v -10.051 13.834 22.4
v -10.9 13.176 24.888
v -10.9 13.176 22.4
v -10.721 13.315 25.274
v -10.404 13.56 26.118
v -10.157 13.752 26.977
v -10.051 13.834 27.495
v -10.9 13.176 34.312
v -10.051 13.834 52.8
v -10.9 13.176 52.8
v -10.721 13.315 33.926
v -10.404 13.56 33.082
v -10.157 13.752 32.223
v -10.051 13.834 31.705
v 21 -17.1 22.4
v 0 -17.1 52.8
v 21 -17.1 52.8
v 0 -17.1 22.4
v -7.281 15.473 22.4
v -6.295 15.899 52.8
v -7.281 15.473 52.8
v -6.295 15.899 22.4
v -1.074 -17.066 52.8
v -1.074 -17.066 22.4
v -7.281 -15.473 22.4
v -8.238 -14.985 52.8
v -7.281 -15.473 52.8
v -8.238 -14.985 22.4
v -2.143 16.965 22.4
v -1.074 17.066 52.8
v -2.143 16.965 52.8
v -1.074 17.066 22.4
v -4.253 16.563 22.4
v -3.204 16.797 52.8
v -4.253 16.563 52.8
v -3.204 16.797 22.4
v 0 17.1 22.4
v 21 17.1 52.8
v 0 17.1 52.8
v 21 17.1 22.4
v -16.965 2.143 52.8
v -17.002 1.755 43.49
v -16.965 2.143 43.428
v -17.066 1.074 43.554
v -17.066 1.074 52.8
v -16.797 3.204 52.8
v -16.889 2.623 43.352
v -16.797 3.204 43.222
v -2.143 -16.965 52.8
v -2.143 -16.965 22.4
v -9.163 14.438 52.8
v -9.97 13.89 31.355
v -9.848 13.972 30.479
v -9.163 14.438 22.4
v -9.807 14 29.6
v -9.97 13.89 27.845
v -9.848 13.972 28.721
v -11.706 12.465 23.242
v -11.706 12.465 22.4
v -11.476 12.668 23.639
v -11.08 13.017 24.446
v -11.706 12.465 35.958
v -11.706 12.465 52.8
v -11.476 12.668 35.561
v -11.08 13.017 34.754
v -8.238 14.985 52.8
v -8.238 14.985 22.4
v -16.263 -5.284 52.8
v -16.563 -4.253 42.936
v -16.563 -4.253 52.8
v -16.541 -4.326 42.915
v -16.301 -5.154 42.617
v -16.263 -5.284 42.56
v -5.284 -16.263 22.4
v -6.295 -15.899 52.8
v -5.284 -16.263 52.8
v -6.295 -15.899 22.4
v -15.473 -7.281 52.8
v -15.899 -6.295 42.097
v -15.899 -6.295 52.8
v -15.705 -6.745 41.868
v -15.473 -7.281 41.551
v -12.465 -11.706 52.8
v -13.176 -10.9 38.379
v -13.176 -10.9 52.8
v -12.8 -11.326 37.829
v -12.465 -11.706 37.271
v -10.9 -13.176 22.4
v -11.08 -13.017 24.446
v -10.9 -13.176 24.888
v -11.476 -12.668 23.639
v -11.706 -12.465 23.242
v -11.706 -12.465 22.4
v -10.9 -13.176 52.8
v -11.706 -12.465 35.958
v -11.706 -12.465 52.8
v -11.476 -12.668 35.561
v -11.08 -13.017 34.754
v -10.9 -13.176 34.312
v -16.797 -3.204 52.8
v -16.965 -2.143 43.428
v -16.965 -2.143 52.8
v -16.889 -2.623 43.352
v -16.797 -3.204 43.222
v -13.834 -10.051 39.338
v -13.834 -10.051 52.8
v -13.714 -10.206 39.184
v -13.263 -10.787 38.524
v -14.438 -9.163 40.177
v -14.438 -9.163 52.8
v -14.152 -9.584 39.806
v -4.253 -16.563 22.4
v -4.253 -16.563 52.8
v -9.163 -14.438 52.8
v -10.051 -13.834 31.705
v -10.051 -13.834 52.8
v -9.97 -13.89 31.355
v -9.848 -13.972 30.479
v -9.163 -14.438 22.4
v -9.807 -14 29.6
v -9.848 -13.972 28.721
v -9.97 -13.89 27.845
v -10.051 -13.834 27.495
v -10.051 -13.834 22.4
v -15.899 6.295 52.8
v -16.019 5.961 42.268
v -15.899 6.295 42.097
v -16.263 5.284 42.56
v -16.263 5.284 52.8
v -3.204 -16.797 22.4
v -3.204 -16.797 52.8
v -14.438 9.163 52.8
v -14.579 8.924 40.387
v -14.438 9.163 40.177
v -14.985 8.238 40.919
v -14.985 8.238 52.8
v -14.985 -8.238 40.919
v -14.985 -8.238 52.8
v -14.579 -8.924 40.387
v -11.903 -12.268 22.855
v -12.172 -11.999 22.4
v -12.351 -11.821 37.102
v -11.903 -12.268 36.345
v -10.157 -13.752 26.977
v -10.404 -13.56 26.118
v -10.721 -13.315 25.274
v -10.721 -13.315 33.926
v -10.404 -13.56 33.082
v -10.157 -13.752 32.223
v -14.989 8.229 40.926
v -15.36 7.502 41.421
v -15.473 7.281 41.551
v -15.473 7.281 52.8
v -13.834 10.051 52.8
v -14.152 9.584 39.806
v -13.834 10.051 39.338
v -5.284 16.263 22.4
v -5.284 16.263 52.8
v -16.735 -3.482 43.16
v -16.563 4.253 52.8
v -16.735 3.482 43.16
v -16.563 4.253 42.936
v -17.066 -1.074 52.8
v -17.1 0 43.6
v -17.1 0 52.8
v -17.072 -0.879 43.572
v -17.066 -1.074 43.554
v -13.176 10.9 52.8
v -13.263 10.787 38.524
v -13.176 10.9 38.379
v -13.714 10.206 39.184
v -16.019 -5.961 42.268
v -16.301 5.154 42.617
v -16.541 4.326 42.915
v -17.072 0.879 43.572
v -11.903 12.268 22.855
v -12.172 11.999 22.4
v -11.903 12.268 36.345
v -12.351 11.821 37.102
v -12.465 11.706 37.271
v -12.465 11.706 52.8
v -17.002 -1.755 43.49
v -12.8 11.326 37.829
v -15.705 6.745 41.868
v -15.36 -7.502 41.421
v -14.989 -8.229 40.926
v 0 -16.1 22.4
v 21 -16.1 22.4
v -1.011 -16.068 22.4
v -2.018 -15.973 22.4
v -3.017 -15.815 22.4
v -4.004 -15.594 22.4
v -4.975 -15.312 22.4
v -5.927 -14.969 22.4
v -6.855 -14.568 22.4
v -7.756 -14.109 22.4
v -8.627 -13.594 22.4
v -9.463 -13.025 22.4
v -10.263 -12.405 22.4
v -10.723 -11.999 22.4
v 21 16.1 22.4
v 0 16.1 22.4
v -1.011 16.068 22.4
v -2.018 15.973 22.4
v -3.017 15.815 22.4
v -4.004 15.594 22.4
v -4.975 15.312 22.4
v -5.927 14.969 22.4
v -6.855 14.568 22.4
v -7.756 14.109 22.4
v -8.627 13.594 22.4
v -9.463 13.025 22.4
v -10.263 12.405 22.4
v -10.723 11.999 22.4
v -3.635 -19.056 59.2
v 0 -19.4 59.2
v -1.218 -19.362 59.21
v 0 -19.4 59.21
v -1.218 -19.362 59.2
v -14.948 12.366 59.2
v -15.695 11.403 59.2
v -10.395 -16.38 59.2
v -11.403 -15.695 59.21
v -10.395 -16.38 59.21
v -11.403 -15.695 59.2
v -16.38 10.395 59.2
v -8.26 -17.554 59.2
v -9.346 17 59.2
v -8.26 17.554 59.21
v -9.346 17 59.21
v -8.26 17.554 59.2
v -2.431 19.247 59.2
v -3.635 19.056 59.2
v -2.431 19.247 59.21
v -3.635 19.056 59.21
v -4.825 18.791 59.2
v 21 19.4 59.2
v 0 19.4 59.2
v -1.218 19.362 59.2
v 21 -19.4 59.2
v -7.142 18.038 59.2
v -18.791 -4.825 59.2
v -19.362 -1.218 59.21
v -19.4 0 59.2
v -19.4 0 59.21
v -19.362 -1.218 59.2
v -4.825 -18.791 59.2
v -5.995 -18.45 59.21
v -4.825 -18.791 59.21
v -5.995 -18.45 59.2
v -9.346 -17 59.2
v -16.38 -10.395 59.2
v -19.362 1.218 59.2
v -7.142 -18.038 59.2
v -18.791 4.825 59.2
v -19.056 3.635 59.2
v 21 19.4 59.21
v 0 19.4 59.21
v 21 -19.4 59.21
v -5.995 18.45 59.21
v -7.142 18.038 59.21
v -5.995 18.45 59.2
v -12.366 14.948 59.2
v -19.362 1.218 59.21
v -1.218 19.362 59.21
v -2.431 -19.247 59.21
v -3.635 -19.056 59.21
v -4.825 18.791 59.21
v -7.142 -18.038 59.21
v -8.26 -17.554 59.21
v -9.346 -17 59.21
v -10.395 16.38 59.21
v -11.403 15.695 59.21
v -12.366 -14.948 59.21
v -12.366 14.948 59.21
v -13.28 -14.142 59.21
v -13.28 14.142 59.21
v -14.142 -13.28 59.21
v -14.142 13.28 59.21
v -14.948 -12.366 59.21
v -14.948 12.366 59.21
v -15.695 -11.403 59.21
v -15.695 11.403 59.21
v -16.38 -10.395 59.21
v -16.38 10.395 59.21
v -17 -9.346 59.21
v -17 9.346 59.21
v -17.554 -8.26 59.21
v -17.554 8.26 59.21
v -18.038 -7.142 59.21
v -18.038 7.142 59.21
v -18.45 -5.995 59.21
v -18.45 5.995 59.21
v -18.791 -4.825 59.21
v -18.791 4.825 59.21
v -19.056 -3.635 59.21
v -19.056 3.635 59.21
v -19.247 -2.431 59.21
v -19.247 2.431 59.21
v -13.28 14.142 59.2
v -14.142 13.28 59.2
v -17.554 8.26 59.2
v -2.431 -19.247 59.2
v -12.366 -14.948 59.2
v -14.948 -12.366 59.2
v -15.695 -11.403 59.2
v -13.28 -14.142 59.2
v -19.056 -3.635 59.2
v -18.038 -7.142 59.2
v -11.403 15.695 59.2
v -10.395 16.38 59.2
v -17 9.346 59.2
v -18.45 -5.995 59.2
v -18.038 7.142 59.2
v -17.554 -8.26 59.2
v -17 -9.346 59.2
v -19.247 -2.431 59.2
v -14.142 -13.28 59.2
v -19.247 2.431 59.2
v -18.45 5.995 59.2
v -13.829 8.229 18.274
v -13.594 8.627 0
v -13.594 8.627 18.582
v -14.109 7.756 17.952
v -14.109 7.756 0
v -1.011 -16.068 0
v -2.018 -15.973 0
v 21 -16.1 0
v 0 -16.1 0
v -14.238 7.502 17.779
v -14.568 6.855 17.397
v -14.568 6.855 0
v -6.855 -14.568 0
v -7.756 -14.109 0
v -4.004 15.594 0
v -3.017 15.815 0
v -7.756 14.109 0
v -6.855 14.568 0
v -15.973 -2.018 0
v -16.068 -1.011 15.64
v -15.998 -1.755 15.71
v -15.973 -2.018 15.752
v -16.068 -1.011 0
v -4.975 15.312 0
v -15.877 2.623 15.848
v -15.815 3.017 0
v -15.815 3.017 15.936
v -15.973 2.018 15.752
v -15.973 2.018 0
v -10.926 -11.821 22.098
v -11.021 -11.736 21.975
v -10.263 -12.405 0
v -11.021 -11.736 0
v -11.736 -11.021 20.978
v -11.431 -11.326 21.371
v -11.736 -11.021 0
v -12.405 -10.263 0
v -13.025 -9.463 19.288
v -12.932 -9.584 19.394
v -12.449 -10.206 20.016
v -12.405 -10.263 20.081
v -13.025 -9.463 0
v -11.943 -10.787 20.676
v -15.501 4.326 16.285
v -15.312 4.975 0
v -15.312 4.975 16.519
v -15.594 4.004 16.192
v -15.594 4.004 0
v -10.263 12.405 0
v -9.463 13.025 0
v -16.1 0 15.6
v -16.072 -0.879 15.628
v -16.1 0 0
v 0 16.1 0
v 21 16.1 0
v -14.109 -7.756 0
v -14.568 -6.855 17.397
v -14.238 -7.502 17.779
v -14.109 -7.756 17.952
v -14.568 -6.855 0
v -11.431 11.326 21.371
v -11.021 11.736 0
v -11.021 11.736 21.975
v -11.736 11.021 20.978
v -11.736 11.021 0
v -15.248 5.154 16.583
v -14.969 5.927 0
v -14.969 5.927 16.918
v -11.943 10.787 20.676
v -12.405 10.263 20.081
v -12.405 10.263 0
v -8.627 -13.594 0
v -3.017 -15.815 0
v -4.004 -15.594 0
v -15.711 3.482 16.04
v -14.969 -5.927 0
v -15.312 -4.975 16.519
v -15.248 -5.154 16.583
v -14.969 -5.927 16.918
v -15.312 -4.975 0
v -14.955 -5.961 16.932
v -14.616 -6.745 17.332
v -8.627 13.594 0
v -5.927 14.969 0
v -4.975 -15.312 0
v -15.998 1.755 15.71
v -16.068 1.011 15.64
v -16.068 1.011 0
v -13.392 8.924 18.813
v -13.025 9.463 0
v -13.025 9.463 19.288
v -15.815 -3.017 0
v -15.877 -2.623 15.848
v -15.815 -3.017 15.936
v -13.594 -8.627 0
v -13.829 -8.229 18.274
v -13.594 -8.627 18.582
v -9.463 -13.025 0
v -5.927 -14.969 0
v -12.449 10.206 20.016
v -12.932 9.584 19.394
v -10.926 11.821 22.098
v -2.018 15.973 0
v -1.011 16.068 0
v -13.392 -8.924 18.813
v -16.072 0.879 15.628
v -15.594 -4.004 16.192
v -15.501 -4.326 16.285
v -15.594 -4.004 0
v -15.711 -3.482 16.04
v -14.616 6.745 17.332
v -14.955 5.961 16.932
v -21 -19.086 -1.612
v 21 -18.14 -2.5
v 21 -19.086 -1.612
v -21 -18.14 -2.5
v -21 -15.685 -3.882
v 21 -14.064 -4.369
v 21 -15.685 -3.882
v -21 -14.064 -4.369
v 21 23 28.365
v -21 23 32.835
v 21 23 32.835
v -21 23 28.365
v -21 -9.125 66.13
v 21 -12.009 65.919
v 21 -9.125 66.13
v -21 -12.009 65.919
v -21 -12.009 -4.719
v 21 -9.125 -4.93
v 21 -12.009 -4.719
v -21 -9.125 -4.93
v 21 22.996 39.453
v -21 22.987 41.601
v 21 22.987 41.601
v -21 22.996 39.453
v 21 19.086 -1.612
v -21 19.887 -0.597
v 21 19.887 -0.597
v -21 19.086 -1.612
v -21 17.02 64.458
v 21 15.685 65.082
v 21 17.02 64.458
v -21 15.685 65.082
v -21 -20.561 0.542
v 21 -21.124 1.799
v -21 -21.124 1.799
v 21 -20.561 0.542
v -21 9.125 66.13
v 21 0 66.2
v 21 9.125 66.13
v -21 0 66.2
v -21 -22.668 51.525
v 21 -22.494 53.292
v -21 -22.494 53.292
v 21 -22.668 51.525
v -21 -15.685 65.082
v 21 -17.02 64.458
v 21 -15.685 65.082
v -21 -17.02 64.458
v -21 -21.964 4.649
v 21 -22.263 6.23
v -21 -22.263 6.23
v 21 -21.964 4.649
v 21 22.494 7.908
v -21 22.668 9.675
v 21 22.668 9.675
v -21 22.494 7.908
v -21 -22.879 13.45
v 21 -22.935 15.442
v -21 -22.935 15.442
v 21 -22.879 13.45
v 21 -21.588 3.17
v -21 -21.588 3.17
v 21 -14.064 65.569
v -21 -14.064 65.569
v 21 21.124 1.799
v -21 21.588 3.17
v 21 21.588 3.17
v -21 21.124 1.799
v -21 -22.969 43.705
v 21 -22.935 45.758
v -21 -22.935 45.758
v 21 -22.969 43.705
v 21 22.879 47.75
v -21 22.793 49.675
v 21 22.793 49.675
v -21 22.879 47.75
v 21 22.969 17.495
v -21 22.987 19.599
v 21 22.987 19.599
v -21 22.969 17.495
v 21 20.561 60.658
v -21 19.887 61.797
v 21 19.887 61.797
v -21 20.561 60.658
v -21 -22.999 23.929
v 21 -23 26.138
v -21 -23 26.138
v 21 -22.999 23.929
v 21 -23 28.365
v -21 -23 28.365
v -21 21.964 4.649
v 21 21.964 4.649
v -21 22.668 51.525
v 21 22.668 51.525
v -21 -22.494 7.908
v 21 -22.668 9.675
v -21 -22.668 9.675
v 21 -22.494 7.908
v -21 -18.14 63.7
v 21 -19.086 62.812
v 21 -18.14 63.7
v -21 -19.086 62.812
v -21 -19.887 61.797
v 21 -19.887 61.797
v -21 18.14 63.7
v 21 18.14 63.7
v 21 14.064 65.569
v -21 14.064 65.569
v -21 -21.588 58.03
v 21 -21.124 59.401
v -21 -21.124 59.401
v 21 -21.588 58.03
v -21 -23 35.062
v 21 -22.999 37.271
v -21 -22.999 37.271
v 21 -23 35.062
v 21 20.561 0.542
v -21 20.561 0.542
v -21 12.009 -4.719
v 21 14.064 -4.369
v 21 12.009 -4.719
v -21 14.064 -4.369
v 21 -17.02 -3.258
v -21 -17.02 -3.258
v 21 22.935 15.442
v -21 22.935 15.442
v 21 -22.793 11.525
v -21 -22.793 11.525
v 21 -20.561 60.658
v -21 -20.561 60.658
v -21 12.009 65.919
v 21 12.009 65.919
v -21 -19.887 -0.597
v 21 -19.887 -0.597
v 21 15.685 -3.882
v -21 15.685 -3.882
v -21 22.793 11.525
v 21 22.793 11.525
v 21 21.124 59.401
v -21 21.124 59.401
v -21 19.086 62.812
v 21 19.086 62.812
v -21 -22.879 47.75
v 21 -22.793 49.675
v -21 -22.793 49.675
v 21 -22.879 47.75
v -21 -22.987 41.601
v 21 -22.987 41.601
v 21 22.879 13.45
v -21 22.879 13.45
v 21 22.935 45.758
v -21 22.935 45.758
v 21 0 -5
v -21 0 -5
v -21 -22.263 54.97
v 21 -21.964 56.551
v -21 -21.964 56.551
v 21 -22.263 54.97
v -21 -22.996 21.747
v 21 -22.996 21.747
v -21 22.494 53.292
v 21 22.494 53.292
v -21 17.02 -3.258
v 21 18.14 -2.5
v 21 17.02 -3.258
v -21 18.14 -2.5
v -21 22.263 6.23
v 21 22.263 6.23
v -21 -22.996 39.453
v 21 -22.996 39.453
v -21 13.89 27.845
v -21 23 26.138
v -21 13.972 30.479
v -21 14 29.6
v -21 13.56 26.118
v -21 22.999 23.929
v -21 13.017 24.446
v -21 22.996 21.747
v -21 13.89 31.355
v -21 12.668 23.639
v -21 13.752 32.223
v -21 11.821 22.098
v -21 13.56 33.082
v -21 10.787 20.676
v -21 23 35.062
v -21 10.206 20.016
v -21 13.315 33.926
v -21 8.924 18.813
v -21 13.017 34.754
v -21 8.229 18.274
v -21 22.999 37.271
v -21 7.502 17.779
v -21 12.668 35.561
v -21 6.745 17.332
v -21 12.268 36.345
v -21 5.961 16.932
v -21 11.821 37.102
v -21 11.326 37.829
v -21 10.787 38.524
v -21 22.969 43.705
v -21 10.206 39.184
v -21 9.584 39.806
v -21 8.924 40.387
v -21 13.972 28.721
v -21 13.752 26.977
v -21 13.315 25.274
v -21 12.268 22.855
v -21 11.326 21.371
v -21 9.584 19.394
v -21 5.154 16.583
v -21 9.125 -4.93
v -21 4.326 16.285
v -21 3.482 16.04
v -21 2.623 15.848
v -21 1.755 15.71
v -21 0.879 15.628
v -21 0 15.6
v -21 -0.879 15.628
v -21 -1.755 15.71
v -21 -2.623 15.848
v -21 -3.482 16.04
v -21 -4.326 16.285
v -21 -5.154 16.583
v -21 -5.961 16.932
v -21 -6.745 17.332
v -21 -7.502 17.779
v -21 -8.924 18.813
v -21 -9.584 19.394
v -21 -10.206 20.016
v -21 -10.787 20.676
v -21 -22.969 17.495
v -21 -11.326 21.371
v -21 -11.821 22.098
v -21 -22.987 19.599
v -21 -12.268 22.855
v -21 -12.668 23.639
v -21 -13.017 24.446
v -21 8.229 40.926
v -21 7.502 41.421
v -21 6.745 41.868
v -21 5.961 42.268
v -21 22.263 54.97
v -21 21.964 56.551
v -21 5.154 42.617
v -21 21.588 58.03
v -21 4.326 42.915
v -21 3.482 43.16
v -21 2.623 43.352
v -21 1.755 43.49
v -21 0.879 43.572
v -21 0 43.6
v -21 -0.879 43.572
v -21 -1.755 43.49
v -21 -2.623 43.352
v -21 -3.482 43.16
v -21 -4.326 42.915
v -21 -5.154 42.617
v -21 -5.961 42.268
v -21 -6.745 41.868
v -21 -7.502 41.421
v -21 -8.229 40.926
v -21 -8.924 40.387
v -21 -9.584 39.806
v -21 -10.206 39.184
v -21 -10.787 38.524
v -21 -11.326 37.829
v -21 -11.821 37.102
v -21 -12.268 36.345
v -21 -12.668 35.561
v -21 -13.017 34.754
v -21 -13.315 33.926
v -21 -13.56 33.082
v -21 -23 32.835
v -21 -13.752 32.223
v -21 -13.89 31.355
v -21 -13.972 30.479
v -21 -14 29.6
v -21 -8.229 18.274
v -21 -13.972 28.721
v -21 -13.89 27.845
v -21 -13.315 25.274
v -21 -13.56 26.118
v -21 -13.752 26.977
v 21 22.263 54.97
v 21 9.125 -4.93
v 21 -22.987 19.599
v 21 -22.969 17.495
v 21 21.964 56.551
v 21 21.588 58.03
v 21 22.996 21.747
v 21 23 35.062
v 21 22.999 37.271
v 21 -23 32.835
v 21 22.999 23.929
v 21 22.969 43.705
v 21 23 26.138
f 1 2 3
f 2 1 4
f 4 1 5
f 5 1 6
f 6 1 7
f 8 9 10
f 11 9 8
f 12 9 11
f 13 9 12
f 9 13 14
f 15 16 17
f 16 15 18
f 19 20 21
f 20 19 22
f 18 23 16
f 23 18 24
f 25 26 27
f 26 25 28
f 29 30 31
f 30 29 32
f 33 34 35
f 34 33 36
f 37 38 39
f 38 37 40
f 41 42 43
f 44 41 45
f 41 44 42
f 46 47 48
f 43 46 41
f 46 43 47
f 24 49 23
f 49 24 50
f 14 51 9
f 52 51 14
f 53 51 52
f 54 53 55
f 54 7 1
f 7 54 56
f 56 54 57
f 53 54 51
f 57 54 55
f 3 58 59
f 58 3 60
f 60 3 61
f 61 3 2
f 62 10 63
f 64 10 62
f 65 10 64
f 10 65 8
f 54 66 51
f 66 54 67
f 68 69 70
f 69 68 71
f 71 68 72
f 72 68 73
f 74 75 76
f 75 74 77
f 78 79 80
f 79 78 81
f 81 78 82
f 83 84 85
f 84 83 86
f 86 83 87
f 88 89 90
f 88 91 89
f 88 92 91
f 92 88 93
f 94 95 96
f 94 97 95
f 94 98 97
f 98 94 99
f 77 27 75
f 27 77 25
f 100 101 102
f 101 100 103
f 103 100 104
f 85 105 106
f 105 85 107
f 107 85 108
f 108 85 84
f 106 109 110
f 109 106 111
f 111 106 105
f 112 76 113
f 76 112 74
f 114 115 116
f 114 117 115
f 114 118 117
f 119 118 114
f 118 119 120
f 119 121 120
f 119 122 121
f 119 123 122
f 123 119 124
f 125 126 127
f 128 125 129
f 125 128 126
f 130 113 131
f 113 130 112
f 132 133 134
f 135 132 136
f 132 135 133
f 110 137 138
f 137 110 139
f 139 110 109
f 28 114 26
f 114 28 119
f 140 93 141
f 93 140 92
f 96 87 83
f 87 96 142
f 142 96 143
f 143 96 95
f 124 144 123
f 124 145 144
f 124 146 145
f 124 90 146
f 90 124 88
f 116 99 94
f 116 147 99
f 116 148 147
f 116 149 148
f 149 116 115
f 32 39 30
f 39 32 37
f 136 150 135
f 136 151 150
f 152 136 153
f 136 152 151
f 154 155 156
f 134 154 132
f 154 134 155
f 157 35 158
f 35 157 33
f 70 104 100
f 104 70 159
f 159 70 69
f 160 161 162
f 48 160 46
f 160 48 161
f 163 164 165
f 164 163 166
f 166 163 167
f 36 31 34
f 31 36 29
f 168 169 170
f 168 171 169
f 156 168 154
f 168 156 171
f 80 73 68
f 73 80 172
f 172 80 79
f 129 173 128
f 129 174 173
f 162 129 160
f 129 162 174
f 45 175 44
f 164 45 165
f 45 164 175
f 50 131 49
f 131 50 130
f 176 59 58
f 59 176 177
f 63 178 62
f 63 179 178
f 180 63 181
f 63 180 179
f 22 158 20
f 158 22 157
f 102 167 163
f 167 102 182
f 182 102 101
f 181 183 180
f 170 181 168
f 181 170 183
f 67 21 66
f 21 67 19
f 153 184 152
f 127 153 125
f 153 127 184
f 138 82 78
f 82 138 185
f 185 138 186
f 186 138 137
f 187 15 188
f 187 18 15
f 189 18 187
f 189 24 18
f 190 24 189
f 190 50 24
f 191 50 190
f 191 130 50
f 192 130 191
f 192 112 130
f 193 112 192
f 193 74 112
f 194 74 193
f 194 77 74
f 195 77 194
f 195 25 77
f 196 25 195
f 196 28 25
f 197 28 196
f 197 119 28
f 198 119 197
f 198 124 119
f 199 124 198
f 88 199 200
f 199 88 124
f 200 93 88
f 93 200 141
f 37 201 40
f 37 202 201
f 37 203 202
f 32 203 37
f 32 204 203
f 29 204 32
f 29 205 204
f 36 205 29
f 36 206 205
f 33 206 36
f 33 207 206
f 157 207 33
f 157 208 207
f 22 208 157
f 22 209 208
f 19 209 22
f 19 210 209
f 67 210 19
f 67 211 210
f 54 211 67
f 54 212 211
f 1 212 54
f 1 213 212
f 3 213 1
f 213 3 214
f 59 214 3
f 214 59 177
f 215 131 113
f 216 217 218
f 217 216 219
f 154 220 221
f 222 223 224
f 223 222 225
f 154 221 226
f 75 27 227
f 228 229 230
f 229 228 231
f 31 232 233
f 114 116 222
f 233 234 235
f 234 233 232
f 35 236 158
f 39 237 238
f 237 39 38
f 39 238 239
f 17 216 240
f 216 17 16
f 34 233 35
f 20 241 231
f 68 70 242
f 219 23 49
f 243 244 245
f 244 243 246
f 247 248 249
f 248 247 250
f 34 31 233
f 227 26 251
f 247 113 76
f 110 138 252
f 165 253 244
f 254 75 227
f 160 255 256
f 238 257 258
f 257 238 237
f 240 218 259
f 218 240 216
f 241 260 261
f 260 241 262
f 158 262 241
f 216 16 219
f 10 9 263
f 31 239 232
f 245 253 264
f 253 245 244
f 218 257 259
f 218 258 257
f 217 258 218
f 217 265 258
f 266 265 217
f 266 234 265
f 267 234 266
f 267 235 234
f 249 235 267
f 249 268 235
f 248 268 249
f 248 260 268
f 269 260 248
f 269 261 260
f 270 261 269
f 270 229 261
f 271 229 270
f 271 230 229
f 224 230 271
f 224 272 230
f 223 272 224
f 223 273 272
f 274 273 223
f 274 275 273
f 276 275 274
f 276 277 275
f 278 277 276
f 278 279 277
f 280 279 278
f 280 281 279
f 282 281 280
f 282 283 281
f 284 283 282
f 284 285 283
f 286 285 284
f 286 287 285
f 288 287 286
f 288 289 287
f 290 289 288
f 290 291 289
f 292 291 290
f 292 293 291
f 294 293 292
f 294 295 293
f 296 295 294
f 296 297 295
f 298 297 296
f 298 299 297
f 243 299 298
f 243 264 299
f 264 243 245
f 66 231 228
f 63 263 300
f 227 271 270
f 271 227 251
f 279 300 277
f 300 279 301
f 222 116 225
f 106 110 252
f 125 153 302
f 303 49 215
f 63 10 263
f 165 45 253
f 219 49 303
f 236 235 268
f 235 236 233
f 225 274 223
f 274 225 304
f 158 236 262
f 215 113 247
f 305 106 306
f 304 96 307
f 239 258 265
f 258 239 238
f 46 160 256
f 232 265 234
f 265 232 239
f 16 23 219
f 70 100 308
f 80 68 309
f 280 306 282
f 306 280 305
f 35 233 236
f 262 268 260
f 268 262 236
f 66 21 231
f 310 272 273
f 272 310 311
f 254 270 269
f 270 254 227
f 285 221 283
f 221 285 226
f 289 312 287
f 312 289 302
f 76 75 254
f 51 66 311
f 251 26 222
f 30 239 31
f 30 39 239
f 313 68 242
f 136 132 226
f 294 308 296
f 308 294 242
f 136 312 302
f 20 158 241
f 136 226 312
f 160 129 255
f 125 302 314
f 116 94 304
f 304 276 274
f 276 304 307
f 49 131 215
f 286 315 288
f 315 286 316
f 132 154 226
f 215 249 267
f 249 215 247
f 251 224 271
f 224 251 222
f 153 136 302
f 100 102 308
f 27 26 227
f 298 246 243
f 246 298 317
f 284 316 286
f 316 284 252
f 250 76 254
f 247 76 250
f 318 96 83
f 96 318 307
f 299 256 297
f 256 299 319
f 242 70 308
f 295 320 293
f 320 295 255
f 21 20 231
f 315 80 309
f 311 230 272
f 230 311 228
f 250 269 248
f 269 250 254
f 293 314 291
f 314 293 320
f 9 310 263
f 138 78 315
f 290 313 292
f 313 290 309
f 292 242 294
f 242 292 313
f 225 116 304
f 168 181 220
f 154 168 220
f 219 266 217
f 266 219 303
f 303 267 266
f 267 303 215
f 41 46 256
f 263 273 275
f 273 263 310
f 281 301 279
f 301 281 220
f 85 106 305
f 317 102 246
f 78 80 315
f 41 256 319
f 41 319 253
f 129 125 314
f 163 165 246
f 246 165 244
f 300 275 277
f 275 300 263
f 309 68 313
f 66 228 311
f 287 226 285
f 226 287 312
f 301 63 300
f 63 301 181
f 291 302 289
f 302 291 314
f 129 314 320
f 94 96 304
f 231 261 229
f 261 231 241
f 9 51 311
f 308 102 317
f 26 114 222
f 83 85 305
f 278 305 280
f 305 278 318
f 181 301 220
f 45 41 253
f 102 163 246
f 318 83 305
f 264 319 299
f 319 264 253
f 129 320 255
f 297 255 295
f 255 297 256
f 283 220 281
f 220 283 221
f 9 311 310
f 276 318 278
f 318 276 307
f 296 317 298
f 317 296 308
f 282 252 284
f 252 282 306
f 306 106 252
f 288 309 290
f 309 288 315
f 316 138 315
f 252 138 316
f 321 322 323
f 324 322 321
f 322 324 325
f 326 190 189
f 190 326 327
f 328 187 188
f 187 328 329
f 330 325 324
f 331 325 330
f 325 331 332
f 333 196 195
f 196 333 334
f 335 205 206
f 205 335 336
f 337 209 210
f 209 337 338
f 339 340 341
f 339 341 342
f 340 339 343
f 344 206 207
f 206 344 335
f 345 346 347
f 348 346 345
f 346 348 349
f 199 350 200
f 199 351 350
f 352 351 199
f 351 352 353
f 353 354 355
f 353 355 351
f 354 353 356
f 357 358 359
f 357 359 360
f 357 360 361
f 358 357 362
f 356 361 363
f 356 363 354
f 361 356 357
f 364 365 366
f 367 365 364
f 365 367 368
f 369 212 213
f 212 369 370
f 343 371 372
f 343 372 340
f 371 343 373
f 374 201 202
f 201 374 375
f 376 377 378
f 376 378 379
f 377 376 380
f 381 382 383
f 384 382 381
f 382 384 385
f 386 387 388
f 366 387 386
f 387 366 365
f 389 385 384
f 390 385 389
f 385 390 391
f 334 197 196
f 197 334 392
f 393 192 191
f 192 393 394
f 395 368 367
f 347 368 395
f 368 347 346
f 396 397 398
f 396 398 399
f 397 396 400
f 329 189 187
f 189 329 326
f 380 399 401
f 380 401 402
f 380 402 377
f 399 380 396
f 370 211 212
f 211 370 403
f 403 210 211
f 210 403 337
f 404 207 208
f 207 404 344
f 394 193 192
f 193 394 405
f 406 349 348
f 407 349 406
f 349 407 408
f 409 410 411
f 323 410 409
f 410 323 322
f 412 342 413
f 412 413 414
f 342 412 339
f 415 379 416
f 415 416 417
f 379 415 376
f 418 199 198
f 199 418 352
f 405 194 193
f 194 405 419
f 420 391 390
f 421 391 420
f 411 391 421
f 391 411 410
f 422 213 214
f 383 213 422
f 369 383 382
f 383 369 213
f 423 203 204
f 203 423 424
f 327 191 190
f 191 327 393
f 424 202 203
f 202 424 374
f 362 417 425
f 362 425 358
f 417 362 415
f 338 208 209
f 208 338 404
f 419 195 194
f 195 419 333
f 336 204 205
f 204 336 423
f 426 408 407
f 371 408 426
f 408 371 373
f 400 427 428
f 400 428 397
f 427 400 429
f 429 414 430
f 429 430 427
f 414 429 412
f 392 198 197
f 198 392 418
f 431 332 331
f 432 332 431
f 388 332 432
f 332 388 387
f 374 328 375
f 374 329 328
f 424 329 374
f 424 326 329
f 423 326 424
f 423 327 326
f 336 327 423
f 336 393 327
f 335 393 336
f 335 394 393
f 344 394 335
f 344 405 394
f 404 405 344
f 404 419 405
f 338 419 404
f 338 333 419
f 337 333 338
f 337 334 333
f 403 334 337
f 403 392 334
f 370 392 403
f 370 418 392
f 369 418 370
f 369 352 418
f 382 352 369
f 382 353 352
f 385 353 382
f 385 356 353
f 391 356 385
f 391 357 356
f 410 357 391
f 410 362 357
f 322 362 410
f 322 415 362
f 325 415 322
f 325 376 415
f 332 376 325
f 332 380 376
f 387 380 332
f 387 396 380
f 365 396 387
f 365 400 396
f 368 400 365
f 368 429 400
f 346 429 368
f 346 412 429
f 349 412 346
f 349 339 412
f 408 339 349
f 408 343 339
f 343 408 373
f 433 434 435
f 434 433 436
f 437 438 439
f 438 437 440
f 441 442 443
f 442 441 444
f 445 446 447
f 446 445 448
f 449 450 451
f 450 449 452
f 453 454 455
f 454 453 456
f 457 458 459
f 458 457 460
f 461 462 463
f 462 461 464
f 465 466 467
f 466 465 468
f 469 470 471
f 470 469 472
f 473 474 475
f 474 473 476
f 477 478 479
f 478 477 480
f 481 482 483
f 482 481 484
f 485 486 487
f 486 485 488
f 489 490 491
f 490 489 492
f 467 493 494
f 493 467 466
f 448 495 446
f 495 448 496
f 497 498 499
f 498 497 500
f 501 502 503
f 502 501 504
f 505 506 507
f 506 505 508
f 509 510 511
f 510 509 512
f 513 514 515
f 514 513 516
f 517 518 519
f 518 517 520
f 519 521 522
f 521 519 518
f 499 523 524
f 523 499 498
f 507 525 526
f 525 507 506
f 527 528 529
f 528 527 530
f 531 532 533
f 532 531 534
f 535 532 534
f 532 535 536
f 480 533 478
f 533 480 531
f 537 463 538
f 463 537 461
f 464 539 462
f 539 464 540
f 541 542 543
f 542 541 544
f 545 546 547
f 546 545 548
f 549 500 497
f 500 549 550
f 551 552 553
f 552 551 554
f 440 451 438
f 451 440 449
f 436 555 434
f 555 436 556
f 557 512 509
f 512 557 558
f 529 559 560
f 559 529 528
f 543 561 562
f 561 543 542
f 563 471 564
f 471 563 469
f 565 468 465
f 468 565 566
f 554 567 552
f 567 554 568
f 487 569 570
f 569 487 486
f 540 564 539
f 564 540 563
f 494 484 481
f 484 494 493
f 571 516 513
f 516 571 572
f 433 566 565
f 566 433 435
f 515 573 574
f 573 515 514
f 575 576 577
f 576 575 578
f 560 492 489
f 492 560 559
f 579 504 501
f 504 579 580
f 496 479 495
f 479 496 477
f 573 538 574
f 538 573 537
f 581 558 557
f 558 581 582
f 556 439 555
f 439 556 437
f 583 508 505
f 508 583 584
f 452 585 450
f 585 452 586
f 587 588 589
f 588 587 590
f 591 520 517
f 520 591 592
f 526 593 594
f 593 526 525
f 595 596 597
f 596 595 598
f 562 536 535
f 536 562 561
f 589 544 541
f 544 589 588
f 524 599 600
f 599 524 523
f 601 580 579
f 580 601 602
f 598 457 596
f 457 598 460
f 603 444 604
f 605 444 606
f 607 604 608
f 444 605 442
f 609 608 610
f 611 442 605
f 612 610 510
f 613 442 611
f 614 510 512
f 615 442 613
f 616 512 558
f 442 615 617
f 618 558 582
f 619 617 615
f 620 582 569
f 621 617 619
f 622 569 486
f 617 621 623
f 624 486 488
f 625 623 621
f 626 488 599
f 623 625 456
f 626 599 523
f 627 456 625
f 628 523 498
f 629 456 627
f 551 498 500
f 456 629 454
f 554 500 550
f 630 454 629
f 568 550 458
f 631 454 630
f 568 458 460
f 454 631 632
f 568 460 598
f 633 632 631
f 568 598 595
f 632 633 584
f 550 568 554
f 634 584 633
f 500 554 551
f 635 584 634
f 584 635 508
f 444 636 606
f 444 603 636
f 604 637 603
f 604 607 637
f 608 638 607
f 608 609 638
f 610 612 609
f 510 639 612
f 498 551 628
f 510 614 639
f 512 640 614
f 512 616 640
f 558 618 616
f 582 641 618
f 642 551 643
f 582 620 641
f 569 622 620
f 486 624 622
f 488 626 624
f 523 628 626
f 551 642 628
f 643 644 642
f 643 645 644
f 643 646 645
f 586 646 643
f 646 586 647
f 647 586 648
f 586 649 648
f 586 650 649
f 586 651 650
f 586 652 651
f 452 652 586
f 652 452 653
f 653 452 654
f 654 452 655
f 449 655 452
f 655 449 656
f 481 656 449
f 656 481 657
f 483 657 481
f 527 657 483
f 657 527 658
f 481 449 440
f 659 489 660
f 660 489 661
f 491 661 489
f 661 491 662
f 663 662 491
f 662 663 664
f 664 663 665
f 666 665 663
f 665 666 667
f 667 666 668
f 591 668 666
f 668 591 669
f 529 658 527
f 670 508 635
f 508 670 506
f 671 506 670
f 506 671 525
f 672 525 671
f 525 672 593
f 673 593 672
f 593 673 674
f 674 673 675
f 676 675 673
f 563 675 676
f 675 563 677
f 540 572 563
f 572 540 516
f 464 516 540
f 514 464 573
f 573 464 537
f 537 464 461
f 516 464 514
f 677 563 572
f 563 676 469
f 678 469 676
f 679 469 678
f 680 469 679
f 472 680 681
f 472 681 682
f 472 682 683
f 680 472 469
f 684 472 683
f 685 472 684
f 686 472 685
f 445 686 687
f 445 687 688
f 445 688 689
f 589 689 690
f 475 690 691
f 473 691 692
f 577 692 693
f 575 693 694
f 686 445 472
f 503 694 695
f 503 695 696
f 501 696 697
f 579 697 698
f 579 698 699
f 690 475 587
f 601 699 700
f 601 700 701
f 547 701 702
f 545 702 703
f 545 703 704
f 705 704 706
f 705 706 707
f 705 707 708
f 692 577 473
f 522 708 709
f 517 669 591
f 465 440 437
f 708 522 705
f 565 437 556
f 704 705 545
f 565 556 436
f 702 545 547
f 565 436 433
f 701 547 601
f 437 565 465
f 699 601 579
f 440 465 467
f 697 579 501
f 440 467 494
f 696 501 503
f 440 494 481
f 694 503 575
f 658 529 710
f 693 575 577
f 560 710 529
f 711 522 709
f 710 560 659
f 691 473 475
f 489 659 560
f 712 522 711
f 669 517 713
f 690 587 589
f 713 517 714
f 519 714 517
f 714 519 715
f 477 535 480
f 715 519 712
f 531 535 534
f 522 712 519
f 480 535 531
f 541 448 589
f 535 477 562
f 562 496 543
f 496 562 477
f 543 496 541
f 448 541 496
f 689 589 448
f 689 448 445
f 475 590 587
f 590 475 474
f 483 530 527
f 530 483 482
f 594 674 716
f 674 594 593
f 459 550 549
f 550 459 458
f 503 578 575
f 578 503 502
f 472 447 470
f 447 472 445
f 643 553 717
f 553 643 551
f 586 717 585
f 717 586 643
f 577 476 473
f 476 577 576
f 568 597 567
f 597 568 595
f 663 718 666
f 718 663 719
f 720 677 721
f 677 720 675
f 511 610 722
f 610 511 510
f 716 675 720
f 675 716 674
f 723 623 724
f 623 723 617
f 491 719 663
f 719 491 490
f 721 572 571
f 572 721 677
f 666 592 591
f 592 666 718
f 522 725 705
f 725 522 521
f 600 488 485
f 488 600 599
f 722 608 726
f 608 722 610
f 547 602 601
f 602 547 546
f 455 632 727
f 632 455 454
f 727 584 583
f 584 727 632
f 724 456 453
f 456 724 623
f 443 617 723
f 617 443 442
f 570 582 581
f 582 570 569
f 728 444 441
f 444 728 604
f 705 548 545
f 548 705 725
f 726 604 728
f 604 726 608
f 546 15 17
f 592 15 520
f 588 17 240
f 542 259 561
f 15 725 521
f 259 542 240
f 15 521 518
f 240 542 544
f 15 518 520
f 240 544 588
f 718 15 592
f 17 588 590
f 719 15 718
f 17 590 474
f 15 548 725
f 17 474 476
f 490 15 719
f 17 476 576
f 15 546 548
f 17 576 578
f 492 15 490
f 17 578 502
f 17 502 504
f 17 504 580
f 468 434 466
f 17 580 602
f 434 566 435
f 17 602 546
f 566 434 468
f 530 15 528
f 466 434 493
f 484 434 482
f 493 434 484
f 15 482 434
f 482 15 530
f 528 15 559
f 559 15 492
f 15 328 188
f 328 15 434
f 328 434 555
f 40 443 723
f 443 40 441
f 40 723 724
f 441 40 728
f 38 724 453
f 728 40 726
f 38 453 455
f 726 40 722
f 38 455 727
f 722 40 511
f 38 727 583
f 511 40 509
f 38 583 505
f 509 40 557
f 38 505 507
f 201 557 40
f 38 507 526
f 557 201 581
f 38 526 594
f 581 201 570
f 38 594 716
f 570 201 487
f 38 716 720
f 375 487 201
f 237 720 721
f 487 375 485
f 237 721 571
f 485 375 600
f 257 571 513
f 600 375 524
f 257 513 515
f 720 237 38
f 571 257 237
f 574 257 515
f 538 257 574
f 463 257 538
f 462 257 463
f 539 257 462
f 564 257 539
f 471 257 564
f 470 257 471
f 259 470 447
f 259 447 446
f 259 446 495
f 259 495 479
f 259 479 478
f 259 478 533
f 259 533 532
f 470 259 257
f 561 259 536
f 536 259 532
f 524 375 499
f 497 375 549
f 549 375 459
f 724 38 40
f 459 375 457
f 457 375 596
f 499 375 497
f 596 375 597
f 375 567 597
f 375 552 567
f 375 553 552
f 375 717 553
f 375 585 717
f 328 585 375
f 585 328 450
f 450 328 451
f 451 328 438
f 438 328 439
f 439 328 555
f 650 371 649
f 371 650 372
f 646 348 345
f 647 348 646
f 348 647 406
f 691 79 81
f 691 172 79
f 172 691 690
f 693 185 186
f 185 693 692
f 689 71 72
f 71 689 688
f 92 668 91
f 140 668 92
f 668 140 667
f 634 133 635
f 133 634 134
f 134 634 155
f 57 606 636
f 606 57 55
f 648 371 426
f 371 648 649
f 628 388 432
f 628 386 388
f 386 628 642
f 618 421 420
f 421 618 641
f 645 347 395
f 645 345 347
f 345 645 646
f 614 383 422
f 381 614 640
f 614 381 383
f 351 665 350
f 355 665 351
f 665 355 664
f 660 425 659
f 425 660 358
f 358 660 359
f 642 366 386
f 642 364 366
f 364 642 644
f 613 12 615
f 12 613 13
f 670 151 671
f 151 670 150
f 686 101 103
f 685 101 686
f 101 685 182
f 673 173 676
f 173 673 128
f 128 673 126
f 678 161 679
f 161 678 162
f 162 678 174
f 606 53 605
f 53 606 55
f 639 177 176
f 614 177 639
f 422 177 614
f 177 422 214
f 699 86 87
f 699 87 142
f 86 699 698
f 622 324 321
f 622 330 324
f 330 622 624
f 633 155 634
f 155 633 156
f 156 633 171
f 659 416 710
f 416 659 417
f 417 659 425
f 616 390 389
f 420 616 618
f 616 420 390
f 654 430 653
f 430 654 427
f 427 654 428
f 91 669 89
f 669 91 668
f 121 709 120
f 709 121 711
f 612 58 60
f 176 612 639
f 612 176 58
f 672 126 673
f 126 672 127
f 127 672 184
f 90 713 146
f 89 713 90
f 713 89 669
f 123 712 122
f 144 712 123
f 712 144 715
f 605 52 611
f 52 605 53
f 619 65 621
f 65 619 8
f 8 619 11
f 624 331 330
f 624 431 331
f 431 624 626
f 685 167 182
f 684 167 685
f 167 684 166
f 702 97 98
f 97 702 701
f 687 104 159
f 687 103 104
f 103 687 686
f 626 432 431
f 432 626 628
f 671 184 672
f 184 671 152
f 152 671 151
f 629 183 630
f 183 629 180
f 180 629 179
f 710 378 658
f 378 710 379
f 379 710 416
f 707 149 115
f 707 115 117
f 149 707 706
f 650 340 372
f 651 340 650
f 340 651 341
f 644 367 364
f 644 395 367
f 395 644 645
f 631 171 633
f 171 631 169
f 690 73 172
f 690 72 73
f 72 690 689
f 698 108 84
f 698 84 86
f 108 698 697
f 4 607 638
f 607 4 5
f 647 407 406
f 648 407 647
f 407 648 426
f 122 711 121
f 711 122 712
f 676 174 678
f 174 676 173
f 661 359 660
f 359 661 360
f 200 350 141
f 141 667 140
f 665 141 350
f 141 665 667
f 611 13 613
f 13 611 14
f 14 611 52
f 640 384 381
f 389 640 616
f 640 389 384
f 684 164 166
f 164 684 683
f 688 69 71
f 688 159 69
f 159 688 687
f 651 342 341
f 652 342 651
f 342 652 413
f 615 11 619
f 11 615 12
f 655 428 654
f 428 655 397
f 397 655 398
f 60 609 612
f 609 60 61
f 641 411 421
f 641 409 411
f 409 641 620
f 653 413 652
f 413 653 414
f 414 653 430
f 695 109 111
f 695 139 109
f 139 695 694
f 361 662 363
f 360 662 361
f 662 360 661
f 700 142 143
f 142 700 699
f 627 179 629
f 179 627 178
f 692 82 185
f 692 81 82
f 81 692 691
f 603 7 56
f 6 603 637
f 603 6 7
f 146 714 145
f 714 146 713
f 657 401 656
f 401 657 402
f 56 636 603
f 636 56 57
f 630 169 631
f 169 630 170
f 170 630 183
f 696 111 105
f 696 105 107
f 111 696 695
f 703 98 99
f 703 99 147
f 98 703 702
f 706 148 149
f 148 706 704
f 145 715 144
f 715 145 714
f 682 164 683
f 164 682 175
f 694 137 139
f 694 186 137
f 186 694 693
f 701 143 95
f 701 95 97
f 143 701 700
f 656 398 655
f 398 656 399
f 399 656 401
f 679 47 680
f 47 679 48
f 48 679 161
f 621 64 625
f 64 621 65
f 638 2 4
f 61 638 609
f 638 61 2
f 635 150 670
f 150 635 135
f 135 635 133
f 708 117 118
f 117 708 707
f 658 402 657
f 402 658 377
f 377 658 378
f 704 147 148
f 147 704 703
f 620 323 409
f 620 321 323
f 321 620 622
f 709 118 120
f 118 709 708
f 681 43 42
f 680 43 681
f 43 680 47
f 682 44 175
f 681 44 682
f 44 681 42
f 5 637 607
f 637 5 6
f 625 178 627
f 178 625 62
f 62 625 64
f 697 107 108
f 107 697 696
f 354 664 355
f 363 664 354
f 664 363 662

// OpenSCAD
// file: ../../functions/reverse.scad
function reverse(lst) =
  let(max = len(lst) - 1) [for(idx = [0 : max]) lst[max - idx]];
// file: ../../modules/extrude_x.scad
module extrude_x(offset = 0) hull() {
  children();
  translate([offset, 0]) children();
}
// file: ../../modules/superellipse.scad
use <../functions/reverse.scad>

module superellipse(ra = 1, rb = 1, n = 3, $fn = 100) {
  inv_n = 1 / n;
  step = 90 / $fn * 4;

  pos_quadrant_pts = [
    for(angle = [0 : step : 90])
      let(x = sin(angle) * ra, y = rb * (1 - (x / ra) ^ n) ^ inv_n) [x, y]
  ];

  rev_pos_quadrant_pts = reverse(pos_quadrant_pts);

  polygon(points = [
    each rev_pos_quadrant_pts,
    for(p = pos_quadrant_pts) [-p.x, p.y],
    for(p = rev_pos_quadrant_pts) [-p.x, -p.y],
    for(p = pos_quadrant_pts) [p.x, -p.y]
  ]);
}
// main file
use <../../modules/superellipse.scad>
use <../../modules/extrude_x.scad>

$fn = 100;

horizontal_tolerance = 0.5;
vertical_tolerance = 0.4;
mounting_flange_height = 22;
// body_height = 17.1;
body_height = 30;
rubber_eyecap_height = 6.4;

difference() {
  ht = horizontal_tolerance;
  vt = vertical_tolerance;

  mfh = mounting_flange_height + vt;
  bh = body_height + vt;
  reh = rubber_eyecap_height;
  eyepiece_height = mfh + bh + reh;
  ehh = eyepiece_height / 2;

  translate([-21, 0, 1 + ehh])
    rotate([0, 90])
    linear_extrude(height = 42)
    superellipse(ra = 6 + ehh, rb = 23, n = 5);

  union() {
    extrude_x(25) cylinder(d = 31.7 + ht, h = mfh + 0.1);

    translate([0, 0, mfh]) {
      extrude_x(25) cylinder(d = 33.7 + ht, h = bh + 0.1);

      extrude_x(25) translate([0, 0, bh]) hull() {
        cylinder(d = 33.7 + ht, h = 0.01);
        translate([0, 0, reh]) cylinder(d = 38.3 + ht, h = 0.01);
      }
    }
  }

  translate([-50 / 2, 0, ehh]) rotate([0, 90]) cylinder(d = 28, h = 20);
}
